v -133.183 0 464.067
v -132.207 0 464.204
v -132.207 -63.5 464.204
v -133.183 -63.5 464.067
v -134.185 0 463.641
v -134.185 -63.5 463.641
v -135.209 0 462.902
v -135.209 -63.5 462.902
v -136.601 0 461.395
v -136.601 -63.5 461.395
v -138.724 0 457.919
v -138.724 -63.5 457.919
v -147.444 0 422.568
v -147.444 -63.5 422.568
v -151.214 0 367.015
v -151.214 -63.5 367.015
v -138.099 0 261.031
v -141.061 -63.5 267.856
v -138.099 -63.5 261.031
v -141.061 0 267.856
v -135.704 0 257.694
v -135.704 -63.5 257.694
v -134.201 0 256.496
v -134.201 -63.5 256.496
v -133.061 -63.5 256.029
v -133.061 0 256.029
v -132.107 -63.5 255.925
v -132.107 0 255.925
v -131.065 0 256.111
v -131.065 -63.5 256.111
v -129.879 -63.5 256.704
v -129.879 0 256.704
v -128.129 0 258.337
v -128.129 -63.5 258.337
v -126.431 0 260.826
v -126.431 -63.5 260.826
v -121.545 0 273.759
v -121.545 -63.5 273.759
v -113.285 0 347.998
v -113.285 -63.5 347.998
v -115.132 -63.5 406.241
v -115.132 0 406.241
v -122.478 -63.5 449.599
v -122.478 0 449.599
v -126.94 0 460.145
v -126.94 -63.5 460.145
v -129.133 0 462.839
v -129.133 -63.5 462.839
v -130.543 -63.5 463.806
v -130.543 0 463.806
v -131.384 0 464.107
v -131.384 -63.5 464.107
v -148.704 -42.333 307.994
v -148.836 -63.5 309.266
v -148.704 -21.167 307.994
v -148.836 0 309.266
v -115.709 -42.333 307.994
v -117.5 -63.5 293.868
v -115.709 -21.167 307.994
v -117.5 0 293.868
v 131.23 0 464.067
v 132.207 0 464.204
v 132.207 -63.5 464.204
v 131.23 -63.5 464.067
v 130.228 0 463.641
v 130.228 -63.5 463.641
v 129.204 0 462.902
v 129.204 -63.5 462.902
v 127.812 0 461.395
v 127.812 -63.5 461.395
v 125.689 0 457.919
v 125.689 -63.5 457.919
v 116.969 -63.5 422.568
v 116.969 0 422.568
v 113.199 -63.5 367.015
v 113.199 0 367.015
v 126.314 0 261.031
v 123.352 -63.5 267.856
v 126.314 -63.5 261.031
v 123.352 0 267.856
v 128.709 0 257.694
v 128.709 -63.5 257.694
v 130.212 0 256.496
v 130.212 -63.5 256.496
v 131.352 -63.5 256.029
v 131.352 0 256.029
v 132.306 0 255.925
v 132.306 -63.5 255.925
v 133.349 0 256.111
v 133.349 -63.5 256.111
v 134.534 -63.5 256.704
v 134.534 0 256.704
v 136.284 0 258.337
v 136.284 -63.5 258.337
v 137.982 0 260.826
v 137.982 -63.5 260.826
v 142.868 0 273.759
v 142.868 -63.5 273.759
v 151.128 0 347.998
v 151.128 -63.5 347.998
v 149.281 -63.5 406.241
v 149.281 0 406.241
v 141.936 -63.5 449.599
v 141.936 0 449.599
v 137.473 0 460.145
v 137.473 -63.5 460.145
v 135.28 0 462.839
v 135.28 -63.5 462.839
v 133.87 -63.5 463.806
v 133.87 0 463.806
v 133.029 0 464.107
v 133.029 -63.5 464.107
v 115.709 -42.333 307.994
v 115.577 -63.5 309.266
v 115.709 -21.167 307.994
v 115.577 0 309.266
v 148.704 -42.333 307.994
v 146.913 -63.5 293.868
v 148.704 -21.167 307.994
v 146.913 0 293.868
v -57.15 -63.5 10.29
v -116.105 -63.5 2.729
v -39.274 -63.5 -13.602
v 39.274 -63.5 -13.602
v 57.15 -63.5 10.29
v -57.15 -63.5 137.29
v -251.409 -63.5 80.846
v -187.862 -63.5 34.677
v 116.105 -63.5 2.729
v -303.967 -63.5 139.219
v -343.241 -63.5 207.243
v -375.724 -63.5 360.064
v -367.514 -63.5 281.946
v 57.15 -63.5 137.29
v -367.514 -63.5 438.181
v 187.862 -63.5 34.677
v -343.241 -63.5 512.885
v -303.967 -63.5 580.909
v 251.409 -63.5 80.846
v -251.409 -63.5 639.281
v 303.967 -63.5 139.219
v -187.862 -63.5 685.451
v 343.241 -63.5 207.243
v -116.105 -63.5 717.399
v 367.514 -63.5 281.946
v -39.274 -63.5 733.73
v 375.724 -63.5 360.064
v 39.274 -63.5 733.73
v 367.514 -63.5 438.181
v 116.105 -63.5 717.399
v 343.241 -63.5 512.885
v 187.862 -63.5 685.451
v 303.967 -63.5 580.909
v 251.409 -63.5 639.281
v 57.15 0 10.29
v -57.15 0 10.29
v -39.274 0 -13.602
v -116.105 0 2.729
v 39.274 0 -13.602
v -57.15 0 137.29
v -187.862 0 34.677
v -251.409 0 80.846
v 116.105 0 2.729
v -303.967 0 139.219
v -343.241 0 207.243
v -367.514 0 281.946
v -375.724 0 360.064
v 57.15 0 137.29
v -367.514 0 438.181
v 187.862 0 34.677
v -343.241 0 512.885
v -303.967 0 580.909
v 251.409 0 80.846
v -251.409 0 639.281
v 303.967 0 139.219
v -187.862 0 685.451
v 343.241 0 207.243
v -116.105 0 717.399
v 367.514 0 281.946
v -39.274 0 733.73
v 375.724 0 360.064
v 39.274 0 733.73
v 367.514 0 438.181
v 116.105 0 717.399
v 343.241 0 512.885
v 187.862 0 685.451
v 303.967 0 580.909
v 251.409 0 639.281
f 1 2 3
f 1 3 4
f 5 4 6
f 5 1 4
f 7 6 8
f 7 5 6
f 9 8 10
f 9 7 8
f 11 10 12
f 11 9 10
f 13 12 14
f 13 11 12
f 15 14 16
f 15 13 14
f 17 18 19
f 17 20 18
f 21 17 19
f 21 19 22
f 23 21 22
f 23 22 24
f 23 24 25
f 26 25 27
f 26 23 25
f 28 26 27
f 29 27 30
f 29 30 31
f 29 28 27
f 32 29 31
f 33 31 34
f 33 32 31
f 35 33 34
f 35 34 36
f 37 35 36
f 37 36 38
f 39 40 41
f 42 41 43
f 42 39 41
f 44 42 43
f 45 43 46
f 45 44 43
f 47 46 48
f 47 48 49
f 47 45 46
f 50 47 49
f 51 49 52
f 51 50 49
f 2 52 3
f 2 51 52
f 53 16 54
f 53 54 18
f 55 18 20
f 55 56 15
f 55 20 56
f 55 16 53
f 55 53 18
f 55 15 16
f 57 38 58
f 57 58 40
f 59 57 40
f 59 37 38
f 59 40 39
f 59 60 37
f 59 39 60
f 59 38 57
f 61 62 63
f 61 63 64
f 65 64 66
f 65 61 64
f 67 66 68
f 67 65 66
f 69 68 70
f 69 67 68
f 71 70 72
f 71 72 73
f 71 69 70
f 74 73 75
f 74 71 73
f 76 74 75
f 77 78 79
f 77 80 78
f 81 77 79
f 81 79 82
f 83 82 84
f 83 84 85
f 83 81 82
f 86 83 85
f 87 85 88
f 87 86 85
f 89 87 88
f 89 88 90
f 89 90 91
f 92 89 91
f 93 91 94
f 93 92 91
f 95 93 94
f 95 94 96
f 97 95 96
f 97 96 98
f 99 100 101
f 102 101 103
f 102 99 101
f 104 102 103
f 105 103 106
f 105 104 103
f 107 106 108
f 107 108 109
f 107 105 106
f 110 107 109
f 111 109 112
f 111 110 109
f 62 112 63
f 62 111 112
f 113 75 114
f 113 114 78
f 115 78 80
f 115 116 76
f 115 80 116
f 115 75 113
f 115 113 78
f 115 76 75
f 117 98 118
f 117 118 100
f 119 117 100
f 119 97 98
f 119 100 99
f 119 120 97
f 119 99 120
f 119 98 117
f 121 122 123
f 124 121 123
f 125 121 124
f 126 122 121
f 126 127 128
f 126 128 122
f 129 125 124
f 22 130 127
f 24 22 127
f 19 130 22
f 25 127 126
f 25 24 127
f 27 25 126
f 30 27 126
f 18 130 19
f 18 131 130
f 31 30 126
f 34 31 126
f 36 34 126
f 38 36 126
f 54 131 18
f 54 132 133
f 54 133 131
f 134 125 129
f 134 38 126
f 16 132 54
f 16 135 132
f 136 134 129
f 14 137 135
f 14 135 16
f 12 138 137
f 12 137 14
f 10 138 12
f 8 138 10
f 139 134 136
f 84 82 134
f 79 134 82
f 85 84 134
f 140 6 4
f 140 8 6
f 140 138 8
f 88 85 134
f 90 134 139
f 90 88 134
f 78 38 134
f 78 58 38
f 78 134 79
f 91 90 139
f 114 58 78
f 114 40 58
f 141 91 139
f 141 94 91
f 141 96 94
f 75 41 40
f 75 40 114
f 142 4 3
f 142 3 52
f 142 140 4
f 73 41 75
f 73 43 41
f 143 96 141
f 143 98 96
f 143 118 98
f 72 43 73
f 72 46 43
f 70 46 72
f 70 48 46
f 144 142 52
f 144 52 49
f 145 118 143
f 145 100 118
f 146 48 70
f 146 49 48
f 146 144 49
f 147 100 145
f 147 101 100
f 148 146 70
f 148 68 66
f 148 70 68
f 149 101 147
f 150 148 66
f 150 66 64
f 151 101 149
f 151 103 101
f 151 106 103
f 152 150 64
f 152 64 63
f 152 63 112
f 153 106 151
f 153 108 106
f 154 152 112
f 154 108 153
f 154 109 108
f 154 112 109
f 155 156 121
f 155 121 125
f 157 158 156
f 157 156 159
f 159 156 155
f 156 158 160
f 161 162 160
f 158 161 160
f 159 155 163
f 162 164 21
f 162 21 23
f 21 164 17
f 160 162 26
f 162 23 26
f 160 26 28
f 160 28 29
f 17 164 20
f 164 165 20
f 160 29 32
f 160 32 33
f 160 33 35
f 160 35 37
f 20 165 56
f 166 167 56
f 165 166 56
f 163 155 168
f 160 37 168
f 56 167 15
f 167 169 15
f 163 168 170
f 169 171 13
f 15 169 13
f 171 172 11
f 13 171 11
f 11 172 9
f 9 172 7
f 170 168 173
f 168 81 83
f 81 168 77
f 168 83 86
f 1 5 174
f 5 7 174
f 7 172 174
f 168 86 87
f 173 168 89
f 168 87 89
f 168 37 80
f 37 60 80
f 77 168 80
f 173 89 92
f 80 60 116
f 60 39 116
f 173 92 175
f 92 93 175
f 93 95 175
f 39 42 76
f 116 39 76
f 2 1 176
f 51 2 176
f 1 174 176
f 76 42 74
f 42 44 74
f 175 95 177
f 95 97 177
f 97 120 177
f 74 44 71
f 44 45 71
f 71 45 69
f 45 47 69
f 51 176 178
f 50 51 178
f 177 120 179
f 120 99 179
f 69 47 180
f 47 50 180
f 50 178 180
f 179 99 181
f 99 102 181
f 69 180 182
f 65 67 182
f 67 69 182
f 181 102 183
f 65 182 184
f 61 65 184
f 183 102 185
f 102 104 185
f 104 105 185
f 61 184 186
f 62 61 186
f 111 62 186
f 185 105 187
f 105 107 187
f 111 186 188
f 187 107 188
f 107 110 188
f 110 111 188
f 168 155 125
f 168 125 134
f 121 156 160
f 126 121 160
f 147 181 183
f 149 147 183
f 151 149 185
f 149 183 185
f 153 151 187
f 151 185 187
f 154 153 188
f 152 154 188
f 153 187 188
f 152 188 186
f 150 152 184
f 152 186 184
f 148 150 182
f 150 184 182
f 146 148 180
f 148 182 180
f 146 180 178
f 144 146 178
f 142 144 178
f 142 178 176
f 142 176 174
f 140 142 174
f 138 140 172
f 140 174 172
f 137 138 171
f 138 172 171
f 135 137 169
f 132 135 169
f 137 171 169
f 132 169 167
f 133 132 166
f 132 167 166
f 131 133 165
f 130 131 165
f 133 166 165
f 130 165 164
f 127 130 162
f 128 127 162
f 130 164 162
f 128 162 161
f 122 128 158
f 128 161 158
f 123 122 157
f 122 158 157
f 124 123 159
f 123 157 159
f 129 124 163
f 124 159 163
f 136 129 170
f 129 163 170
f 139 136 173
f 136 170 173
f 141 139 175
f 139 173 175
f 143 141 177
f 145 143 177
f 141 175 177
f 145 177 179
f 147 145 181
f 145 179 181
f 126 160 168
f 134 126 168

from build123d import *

# Parameters (mm, degrees)
F0_R     = 375.724351
F0_W     = 114.3
F0_H     = 127
F1_DEPTH = 63.5


with BuildPart() as f1:
    # F0 (on Front) → F1 (new body)
    with BuildSketch(Plane.XZ):
        with Locations((0, 360.063826)):
            Circle(F0_R)
        with Locations((0, 73.789552)):
            Rectangle(F0_W, F0_H, mode=Mode.SUBTRACT)
        with BuildLine():
            add(Edge.make_bspline(
                [(-132.206574, 464.203826), (-165.202142, 464.203826), (-148.704358, 307.993826), (-132.206574, 151.783826), (-115.70879, 307.993826), (-99.211006, 464.203826), (-132.206574, 464.203826)],
                knots=[0, 0, 0, 2.094395, 2.094395, 4.18879, 4.18879, 6.283185, 6.283185, 6.283185], degree=2, weights=[1, 0.5, 1, 0.5, 1, 0.5, 1]))
        make_face(mode=Mode.SUBTRACT)
        with BuildLine():
            add(Edge.make_bspline(
                [(132.206574, 464.203826), (99.211006, 464.203826), (115.70879, 307.993826), (132.206574, 151.783826), (148.704358, 307.993826), (165.202142, 464.203826), (132.206574, 464.203826)],
                knots=[0, 0, 0, 2.094395, 2.094395, 4.18879, 4.18879, 6.283185, 6.283185, 6.283185], degree=2, weights=[1, 0.5, 1, 0.5, 1, 0.5, 1]))
        make_face(mode=Mode.SUBTRACT)
    extrude(amount=F1_DEPTH)


solid = f1.part
